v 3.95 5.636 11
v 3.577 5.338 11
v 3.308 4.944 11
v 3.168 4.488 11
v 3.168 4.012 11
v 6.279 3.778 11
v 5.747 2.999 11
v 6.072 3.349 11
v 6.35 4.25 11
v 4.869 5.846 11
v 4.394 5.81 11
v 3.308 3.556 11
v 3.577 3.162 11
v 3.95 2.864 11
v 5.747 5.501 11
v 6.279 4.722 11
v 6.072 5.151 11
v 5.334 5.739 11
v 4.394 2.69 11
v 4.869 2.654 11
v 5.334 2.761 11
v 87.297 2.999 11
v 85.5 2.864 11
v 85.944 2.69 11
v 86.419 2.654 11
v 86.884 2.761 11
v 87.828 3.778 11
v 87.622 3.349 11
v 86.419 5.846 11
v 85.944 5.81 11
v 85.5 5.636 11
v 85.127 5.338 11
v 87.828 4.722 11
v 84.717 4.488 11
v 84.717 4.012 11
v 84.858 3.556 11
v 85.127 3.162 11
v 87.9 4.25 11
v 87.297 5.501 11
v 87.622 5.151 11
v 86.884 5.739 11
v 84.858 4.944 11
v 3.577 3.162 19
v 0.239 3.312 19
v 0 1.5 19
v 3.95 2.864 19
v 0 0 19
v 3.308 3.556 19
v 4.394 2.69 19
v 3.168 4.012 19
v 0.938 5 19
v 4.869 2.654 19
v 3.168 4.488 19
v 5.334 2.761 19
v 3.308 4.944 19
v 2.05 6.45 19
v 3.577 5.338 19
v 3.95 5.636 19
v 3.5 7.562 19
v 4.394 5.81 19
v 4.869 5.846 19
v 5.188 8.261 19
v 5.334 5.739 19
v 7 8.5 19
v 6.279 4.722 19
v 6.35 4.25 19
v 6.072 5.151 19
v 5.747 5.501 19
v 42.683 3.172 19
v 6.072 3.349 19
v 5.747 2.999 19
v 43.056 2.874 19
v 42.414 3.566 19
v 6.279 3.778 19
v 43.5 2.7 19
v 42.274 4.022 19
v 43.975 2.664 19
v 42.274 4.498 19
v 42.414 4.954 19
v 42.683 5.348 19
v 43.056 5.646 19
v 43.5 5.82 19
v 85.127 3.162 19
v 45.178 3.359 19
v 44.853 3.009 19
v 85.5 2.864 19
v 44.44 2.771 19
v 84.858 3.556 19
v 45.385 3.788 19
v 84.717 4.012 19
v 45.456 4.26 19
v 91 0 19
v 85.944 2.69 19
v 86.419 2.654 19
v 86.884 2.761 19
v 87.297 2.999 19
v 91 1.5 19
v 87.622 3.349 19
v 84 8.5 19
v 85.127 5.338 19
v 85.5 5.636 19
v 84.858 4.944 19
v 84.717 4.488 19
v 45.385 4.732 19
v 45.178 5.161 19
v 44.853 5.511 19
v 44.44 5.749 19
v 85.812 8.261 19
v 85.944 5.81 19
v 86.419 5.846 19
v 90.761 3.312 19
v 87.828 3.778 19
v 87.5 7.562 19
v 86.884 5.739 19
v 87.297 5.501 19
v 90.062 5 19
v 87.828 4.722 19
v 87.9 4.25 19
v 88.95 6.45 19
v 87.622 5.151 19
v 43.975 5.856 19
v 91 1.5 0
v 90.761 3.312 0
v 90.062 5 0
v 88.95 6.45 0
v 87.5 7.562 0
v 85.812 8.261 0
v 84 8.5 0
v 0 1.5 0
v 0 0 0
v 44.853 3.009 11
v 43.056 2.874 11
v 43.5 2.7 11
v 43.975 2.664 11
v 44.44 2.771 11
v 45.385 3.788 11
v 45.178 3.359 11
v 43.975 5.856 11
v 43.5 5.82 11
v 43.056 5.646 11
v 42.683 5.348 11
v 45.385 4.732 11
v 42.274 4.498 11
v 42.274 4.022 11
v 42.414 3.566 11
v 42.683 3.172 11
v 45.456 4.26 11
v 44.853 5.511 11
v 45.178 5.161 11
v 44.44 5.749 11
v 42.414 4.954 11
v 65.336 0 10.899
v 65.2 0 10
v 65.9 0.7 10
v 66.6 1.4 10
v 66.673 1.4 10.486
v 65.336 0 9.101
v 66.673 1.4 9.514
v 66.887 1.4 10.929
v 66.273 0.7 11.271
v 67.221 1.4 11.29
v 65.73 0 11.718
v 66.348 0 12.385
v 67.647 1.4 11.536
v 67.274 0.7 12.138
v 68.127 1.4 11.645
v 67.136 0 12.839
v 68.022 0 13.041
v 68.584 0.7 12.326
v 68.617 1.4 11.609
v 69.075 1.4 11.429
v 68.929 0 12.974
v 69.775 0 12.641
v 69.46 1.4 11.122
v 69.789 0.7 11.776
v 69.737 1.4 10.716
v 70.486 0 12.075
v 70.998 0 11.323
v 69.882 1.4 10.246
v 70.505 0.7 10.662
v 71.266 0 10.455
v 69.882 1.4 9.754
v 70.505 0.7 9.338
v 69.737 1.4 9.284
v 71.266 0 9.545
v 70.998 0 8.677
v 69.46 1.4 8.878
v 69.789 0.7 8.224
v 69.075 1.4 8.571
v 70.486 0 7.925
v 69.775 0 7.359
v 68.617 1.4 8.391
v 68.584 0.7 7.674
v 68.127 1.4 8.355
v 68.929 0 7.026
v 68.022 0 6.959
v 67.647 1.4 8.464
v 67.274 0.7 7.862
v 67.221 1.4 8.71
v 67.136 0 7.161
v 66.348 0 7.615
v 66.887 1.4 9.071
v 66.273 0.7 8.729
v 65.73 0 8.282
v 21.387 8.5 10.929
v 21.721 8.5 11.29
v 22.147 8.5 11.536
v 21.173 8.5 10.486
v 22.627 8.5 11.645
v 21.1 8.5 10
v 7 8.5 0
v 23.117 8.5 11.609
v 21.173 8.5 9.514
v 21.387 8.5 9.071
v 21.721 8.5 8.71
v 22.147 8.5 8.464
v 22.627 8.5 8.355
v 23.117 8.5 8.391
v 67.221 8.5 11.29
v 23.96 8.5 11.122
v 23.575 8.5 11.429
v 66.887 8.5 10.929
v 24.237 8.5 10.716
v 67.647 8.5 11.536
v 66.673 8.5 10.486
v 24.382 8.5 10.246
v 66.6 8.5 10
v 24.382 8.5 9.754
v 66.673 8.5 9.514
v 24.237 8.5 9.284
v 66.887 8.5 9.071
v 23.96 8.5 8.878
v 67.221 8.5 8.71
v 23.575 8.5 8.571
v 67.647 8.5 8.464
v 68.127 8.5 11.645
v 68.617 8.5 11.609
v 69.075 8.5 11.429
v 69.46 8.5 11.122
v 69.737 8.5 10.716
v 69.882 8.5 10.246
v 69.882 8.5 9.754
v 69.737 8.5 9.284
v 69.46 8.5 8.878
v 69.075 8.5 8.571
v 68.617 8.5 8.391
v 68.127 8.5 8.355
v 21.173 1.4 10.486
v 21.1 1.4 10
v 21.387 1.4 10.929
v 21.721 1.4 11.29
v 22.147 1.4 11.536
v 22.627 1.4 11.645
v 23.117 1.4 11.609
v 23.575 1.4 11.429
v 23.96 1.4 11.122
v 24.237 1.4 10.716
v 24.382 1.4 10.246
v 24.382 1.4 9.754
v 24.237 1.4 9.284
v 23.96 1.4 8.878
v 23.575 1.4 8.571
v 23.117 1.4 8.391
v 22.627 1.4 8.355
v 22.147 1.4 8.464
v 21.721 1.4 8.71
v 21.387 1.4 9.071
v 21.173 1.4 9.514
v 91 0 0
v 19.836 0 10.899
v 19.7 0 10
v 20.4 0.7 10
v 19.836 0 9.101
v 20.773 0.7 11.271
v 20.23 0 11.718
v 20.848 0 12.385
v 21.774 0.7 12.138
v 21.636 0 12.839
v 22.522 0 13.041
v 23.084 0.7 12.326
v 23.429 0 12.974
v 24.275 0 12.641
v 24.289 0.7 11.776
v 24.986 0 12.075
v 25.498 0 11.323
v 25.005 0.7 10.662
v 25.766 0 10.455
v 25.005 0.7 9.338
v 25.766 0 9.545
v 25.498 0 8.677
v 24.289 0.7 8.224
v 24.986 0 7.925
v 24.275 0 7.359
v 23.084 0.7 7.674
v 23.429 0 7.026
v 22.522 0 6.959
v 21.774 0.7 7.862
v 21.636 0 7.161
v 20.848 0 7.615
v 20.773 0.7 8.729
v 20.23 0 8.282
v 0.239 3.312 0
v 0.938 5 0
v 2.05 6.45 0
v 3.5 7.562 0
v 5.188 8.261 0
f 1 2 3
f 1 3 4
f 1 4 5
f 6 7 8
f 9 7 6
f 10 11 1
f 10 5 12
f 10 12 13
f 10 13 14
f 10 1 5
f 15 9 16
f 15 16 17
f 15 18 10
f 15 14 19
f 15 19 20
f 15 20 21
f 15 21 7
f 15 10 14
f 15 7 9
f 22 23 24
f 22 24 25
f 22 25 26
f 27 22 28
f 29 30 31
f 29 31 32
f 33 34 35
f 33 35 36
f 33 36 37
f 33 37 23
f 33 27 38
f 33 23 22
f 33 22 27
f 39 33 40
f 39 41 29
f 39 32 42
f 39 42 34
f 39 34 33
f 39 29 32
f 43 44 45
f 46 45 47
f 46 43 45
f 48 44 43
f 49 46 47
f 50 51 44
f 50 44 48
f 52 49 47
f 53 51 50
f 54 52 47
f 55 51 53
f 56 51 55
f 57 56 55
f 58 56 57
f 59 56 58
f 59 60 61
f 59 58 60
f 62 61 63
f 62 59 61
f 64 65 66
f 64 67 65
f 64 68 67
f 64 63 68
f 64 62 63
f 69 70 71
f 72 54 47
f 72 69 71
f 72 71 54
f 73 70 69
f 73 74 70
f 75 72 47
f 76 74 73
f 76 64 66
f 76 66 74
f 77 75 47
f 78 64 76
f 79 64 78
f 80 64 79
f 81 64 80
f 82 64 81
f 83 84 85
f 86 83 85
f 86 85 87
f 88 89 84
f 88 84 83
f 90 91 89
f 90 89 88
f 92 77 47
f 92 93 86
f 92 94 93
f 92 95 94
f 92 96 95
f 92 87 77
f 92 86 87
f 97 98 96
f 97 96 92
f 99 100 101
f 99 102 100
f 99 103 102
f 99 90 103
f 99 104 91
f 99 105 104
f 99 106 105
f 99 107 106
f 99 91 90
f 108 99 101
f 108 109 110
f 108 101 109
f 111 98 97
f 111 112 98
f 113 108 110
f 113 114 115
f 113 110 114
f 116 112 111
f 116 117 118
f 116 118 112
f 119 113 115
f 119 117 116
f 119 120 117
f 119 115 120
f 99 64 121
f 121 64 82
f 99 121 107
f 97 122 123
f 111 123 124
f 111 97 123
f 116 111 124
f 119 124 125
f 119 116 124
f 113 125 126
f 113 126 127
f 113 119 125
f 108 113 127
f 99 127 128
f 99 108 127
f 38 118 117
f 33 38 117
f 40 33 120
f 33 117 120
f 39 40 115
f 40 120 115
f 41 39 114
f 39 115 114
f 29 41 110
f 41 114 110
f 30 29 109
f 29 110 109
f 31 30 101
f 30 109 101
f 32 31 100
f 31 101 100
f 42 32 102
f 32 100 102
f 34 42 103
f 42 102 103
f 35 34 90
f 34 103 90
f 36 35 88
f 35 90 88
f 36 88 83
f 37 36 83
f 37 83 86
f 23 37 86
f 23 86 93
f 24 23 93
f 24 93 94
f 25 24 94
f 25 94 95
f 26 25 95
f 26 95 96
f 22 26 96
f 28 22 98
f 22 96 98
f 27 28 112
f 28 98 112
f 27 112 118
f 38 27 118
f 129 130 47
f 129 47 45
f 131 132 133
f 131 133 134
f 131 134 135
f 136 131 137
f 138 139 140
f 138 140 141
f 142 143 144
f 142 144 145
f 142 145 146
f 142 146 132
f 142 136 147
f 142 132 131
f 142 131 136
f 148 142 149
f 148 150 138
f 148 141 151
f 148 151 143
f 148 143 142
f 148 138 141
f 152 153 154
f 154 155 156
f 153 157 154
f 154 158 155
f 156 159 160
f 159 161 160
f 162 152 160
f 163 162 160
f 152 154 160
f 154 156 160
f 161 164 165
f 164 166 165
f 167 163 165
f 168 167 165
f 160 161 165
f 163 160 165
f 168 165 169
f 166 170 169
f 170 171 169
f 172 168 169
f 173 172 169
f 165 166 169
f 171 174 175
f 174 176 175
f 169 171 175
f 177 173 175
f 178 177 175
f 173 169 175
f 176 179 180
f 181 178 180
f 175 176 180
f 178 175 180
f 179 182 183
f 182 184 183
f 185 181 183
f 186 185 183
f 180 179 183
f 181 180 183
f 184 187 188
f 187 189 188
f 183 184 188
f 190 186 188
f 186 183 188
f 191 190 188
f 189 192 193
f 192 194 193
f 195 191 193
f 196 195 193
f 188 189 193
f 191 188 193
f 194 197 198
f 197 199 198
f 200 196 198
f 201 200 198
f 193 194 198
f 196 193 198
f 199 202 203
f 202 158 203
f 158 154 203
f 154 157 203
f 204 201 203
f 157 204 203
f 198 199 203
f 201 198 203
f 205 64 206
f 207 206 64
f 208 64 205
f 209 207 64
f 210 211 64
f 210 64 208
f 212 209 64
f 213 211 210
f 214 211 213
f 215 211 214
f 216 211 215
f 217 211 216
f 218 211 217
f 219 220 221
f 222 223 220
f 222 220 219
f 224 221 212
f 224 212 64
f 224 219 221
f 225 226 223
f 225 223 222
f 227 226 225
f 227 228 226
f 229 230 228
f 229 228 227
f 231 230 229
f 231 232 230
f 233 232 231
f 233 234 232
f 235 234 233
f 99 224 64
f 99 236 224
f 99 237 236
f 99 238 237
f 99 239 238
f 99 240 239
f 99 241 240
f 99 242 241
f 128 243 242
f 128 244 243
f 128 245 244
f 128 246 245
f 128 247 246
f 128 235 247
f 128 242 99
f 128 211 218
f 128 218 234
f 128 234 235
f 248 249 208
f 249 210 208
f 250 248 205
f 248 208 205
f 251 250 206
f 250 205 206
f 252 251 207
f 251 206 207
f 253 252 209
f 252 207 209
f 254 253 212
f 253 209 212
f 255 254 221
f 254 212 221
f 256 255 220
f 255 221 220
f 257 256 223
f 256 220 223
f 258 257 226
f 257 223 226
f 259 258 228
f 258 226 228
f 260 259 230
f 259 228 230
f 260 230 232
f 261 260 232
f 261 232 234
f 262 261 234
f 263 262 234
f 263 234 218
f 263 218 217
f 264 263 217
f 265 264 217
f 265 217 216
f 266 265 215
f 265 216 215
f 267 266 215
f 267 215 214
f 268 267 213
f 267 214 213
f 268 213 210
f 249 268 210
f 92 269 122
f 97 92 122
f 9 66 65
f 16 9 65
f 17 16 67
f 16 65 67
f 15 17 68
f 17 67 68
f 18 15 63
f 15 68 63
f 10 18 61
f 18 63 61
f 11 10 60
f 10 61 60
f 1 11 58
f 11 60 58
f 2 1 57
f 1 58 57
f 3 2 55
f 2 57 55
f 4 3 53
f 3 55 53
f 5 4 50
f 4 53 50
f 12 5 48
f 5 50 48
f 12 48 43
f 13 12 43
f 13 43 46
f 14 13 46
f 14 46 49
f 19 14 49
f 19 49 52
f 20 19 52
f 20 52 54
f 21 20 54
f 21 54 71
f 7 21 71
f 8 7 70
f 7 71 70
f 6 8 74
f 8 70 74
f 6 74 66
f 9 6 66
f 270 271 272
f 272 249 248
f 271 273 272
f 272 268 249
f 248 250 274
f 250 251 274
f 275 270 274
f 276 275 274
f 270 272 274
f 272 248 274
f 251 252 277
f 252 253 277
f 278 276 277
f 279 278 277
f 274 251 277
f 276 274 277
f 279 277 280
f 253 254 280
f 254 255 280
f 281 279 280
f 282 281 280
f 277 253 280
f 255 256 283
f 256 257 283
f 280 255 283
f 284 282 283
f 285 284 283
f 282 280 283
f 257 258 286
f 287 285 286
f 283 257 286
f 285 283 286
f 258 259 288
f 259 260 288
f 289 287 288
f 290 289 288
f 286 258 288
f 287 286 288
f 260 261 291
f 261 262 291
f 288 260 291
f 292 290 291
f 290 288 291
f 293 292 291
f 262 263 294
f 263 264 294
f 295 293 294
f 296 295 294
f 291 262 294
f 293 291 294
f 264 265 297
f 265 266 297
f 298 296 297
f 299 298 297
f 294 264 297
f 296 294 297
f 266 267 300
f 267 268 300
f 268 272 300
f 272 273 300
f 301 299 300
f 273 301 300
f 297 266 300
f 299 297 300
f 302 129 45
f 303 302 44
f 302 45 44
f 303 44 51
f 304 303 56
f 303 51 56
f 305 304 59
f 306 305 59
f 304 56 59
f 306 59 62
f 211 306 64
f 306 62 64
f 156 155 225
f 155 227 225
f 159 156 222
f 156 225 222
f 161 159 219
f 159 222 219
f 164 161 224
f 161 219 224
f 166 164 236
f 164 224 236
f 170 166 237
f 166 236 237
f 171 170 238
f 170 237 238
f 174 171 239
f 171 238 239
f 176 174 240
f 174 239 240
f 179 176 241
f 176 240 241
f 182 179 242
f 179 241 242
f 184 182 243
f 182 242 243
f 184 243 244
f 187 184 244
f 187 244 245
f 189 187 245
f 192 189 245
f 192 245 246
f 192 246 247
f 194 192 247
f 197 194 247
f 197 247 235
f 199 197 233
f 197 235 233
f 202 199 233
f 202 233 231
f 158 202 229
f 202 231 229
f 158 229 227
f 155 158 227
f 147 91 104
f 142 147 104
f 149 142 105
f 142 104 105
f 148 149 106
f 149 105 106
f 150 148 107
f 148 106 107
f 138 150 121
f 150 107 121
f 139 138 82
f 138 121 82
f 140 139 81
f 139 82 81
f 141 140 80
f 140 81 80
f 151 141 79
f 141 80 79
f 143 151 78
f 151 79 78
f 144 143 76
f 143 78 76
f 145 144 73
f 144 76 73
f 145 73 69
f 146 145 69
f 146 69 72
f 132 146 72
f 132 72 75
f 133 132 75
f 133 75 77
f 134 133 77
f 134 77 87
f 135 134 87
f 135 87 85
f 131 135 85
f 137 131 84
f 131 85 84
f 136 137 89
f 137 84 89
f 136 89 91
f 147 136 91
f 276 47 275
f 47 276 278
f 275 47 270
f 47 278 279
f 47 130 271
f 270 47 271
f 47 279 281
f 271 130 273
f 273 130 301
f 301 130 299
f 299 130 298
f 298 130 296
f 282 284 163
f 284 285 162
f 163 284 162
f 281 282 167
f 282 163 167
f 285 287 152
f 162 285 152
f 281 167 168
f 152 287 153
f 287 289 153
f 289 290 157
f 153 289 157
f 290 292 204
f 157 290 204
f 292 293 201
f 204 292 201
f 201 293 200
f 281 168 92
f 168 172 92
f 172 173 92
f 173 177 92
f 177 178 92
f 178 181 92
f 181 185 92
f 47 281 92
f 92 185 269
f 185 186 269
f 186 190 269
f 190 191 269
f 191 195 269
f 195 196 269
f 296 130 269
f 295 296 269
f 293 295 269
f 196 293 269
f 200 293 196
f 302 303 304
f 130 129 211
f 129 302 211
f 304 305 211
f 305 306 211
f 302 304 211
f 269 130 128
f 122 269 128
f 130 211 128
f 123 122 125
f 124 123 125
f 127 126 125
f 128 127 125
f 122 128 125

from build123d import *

# Parameters (mm, degrees)
SKETCH_W         = 91
SKETCH_H         = 8.5
PAD_DEPTH        = 19
FILLET_R         = 7
SKETCH052_R      = 1.6
POCKET_DEPTH     = 8
HOLE_D           = 3.3
HOLE_DEPTH       = 25
HOLE_CSINK_D     = 6.1
HOLE_CSINK_ANGLE = 90


with BuildPart() as part:
    # Sketch → Pad (new body)
    with BuildSketch(Plane.XY):
        with Locations((45.5, 4.25)):
            Rectangle(SKETCH_W, SKETCH_H)
    extrude(amount=PAD_DEPTH)

    # Fillet
    fillet_edges = [part.edges().sort_by_distance(p)[0] for p in [
        (91, 8.5, 9.5),
        (0, 8.5, 9.5),
    ]]
    fillet(fillet_edges, radius=FILLET_R)

    # Sketch052 (on Face5 of Fillet) → Pocket (cut)
    with BuildSketch(Plane.XY.offset(19)):
        with Locations((4.749754, 4.25)):
            Circle(SKETCH052_R)
        with Locations((86.299538, 4.25)):
            Circle(SKETCH052_R)
        with Locations((43.855799, 4.26)):
            Circle(SKETCH052_R)
    extrude(amount=-POCKET_DEPTH, mode=Mode.SUBTRACT)

    # Hole
    with Locations(Plane.XZ):
        with Locations((22.75, 10), (68.249998, 10)):
            CounterSinkHole(HOLE_D / 2, HOLE_CSINK_D / 2, depth=HOLE_DEPTH, counter_sink_angle=HOLE_CSINK_ANGLE)


solid = part.part
